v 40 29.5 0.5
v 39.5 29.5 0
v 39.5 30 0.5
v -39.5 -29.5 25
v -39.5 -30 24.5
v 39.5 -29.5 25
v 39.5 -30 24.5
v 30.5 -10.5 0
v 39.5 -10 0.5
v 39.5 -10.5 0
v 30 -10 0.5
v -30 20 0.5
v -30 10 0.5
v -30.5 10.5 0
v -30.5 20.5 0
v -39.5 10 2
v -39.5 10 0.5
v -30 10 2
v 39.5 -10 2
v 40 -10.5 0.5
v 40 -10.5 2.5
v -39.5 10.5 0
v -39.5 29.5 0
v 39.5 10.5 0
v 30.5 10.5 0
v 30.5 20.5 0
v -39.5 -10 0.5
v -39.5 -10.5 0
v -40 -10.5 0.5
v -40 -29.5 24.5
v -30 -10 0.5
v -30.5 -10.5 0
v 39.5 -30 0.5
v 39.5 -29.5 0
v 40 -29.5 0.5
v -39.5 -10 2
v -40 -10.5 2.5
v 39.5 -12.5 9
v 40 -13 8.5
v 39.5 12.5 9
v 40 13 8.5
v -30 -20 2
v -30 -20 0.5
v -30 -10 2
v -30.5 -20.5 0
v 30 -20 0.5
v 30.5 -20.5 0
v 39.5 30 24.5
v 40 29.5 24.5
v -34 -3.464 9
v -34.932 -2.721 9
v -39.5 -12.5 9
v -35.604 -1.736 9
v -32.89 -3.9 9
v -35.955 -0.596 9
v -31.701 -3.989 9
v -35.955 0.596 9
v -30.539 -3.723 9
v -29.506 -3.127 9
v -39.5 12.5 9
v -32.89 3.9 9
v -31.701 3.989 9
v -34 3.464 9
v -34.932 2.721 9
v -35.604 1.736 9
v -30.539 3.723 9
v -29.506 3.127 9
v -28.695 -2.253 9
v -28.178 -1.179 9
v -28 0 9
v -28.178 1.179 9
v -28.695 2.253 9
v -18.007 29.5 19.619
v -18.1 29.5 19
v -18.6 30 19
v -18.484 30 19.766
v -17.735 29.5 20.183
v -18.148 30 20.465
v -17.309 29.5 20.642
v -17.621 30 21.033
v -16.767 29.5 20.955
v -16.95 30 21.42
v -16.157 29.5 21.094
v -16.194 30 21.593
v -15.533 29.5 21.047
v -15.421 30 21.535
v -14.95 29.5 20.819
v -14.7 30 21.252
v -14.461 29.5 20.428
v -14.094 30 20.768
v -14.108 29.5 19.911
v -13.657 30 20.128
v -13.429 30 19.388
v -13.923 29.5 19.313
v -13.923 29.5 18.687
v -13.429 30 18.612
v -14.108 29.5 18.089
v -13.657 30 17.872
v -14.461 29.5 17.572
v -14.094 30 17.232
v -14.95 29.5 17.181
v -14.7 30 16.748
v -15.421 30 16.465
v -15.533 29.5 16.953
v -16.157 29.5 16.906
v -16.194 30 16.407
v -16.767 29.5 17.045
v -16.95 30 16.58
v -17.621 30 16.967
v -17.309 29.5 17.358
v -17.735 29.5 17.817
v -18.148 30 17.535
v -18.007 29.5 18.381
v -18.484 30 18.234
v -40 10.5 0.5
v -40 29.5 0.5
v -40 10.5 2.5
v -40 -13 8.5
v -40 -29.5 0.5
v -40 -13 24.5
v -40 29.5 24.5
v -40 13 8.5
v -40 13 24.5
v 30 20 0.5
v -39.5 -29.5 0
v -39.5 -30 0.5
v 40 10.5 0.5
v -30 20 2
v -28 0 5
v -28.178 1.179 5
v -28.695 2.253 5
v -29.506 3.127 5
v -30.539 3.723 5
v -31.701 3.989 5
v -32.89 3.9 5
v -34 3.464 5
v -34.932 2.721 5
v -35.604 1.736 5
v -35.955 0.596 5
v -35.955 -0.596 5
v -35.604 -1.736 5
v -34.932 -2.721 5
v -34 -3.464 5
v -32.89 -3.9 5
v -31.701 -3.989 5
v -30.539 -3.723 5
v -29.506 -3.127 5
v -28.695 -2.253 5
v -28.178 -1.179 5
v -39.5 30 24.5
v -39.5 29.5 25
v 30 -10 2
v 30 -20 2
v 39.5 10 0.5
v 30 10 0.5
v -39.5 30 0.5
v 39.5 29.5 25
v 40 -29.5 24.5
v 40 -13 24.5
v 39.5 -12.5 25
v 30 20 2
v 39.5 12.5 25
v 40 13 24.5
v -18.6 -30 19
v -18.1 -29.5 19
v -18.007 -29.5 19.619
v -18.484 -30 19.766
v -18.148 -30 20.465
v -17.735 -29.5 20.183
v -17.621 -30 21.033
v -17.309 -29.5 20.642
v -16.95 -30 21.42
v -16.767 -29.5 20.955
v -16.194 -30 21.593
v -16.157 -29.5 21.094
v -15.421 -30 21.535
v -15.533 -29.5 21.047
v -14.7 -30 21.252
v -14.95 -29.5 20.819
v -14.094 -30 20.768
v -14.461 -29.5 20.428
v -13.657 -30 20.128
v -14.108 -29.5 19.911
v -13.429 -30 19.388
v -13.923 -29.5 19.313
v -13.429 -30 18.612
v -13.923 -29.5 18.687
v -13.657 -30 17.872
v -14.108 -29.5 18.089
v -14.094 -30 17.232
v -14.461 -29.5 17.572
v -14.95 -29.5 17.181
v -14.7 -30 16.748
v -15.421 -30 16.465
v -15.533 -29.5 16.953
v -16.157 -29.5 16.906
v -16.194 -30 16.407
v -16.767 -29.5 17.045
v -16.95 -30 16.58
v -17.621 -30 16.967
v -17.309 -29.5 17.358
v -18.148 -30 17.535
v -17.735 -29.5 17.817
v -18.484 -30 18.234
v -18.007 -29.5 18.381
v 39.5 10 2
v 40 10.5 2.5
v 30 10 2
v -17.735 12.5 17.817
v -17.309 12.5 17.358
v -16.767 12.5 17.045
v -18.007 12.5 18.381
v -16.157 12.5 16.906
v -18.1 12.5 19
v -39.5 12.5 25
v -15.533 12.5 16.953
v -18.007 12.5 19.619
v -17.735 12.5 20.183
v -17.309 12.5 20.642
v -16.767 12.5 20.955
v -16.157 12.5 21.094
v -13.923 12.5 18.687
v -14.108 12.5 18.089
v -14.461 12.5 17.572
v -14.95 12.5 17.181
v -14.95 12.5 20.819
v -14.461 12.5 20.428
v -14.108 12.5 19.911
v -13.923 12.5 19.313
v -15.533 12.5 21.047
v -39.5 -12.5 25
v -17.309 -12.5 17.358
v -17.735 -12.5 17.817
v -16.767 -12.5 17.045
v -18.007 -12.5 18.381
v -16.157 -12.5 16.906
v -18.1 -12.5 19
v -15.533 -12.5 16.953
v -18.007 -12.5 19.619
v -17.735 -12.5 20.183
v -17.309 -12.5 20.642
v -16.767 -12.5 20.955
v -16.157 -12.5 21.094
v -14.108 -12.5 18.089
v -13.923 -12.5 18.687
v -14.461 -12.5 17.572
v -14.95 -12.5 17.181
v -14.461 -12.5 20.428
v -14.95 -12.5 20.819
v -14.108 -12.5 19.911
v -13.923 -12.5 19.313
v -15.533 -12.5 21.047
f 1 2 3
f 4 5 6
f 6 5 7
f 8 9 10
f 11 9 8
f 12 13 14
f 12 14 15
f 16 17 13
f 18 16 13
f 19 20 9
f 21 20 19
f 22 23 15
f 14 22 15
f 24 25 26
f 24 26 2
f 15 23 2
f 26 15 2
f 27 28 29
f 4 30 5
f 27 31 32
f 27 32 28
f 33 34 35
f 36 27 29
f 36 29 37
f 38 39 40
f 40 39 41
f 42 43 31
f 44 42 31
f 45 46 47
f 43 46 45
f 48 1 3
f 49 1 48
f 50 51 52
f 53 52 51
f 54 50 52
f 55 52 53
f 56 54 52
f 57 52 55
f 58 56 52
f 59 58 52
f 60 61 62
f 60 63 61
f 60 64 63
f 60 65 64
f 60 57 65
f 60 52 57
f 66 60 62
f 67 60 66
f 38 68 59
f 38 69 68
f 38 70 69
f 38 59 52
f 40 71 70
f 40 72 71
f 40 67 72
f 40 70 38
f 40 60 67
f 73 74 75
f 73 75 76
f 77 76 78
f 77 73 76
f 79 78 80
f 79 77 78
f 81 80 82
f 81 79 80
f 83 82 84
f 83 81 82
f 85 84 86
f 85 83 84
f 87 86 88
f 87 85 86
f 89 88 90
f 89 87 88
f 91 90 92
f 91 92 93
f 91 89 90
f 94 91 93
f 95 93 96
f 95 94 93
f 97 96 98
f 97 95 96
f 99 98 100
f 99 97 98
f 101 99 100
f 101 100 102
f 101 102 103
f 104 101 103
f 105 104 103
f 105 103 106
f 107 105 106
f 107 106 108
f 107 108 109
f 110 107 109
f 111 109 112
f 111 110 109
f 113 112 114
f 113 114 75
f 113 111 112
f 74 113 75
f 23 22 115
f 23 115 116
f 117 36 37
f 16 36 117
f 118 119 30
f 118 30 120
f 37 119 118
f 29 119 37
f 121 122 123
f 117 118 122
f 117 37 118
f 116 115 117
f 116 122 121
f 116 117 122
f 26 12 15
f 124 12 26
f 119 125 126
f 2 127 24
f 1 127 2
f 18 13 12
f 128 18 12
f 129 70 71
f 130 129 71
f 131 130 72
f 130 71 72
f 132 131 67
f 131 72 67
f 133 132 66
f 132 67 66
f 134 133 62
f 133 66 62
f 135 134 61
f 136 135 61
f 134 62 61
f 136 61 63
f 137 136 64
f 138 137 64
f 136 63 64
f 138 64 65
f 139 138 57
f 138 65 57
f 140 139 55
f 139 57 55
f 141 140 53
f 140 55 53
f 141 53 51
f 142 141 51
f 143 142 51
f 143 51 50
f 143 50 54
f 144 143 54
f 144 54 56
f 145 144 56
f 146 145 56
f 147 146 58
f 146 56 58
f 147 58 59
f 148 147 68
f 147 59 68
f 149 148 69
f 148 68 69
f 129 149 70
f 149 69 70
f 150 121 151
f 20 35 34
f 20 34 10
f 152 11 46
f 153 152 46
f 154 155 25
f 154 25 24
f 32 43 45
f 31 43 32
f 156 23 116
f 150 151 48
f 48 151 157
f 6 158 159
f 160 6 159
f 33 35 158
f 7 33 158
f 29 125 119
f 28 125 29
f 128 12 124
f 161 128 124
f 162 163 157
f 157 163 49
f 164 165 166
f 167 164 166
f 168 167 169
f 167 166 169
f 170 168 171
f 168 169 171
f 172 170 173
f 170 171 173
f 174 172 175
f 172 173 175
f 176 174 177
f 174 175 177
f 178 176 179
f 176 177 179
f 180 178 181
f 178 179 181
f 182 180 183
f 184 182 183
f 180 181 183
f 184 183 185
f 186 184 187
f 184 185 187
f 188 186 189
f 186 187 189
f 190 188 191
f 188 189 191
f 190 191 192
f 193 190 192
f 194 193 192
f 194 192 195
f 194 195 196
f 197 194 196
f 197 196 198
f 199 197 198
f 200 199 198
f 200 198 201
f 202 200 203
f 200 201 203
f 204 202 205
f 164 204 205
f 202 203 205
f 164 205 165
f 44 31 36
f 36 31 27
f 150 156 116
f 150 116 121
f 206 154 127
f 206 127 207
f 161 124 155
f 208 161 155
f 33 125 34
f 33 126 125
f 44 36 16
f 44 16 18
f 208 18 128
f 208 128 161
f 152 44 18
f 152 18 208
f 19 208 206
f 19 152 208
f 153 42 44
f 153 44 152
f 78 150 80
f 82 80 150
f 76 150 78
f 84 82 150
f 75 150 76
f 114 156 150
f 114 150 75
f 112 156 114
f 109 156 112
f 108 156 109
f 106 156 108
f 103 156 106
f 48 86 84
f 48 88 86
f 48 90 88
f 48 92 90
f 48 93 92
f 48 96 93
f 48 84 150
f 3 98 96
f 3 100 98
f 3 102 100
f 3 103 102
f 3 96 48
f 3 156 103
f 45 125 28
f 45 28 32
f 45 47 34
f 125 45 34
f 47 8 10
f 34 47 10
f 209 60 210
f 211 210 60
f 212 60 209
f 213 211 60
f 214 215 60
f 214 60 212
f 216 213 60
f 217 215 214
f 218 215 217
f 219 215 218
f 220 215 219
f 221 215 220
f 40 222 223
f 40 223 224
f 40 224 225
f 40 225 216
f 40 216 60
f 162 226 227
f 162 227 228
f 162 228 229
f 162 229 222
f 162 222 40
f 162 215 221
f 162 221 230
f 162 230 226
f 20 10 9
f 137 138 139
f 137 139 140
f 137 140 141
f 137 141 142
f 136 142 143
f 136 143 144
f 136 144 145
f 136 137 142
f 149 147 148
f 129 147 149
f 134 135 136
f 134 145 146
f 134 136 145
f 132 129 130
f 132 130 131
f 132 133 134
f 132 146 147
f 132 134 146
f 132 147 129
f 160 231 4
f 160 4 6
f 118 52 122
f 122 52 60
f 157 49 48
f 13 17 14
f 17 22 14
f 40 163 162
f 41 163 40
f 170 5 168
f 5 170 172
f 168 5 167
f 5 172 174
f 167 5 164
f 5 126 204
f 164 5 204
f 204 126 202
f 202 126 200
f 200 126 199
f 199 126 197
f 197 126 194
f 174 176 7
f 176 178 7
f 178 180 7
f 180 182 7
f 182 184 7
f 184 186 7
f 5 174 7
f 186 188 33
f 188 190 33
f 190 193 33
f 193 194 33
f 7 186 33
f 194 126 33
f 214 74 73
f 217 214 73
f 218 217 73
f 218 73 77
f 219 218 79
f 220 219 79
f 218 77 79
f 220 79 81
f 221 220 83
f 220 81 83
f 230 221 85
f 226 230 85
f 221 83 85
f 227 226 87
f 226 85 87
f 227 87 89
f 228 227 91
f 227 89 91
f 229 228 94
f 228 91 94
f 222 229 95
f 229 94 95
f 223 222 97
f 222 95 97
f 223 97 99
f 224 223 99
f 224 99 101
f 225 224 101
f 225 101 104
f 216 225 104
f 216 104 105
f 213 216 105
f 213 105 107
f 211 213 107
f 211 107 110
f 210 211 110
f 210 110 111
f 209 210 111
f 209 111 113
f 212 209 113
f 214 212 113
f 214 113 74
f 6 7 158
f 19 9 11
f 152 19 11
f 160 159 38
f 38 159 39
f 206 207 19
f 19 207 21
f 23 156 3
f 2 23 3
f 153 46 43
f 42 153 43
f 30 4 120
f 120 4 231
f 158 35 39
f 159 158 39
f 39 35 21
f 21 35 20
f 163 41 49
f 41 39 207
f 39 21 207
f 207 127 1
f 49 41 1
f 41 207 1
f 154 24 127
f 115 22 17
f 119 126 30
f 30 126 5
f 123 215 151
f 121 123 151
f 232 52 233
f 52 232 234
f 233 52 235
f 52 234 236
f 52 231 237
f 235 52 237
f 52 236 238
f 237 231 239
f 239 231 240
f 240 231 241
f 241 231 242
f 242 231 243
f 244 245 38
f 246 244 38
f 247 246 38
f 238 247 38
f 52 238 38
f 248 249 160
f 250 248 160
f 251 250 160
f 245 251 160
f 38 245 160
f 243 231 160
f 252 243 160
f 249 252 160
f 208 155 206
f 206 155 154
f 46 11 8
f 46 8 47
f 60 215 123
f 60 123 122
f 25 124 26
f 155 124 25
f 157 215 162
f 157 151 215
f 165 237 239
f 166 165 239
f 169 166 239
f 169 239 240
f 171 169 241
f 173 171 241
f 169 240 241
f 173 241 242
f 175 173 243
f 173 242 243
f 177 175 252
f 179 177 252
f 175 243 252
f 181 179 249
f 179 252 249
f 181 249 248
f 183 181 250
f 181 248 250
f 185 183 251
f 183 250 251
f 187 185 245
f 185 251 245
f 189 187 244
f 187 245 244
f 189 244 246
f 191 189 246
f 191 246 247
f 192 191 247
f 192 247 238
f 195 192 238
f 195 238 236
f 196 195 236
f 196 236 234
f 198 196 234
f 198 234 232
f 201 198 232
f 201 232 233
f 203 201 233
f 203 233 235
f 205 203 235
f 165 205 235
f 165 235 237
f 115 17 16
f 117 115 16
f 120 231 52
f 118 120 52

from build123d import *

# Parameters (mm, degrees)
F0_W     = 80
F0_H     = 60
F1_DEPTH = 25
F3_DEPTH = 2
F4_W     = 80
F4_H     = 25
F5_DEPTH = 16
F6_R     = 4
F7_DEPTH = 4
F9_D     = 4.2
F10_SIZE = 0.5


with BuildPart() as f1:
    # F0 (on Top) → F1 (new body)
    with BuildSketch(Plane.XY):
        Rectangle(F0_W, F0_H)
    extrude(amount=F1_DEPTH)

    # F2 (on face) → F3 (cut)
    with BuildSketch(Plane(origin=(0, 0, 0), x_dir=(1, 0, 0), z_dir=(0, 0, -1))):
        Polygon((30, 10), (30, 20), (-30, 20), (-30, 10), (-40, 10), (-40, -10), (-30, -10), (-30, -20), (30, -20), (30, -10), (40, -10), (40, 10), align=None)
    extrude(amount=-F3_DEPTH, mode=Mode.SUBTRACT)

    # F4 (on face) → F5 (cut)
    with BuildSketch(Plane.XY.offset(25)):
        Rectangle(F4_W, F4_H)
    extrude(amount=-F5_DEPTH, mode=Mode.SUBTRACT)

    # F6 (on face) → F7 (cut)
    with BuildSketch(Plane.XY.offset(9)):
        with Locations((-32, 0)):
            Circle(F6_R)
    extrude(amount=-F7_DEPTH, mode=Mode.SUBTRACT)

    # F9 (through all)
    with Locations(Plane.XZ.offset(30)):
        with Locations((-16, 19)):
            Hole(F9_D / 2)

    # F10
    f10_edges = [f1.edges().sort_by_distance(p)[0] for p in [
        (35, 10, 0),
        (30, 15, 0),
        (0, 20, 0),
        (-30, 15, 0),
        (-35, 10, 0),
        (-40, 20, 0),
        (0, 30, 0),
        (40, 20, 0),
        (0, -30, 0),
        (-40, -20, 0),
        (-35, -10, 0),
        (-30, -15, 0),
        (0, -20, 0),
        (30, -15, 0),
        (35, -10, 0),
        (40, -20, 0),
        (-40, 10, 1),
        (-40, 0, 2),
        (-40, -10, 1),
        (-40, -30, 12.5),
        (-40, -21.25, 25),
        (-40, -12.5, 17),
        (-40, 0, 9),
        (-40, 12.5, 17),
        (-40, 21.25, 25),
        (-40, 30, 12.5),
        (0, -30, 25),
        (40, -30, 12.5),
        (-18.1, -30, 19),
        (40, -10, 1),
        (40, 0, 2),
        (40, 10, 1),
        (40, 30, 12.5),
        (40, 21.25, 25),
        (40, 12.5, 17),
        (40, 0, 9),
        (40, -12.5, 17),
        (40, -21.25, 25),
        (0, 30, 25),
        (-18.1, 30, 19),
    ]]
    chamfer(f10_edges, length=F10_SIZE)


solid = f1.part
